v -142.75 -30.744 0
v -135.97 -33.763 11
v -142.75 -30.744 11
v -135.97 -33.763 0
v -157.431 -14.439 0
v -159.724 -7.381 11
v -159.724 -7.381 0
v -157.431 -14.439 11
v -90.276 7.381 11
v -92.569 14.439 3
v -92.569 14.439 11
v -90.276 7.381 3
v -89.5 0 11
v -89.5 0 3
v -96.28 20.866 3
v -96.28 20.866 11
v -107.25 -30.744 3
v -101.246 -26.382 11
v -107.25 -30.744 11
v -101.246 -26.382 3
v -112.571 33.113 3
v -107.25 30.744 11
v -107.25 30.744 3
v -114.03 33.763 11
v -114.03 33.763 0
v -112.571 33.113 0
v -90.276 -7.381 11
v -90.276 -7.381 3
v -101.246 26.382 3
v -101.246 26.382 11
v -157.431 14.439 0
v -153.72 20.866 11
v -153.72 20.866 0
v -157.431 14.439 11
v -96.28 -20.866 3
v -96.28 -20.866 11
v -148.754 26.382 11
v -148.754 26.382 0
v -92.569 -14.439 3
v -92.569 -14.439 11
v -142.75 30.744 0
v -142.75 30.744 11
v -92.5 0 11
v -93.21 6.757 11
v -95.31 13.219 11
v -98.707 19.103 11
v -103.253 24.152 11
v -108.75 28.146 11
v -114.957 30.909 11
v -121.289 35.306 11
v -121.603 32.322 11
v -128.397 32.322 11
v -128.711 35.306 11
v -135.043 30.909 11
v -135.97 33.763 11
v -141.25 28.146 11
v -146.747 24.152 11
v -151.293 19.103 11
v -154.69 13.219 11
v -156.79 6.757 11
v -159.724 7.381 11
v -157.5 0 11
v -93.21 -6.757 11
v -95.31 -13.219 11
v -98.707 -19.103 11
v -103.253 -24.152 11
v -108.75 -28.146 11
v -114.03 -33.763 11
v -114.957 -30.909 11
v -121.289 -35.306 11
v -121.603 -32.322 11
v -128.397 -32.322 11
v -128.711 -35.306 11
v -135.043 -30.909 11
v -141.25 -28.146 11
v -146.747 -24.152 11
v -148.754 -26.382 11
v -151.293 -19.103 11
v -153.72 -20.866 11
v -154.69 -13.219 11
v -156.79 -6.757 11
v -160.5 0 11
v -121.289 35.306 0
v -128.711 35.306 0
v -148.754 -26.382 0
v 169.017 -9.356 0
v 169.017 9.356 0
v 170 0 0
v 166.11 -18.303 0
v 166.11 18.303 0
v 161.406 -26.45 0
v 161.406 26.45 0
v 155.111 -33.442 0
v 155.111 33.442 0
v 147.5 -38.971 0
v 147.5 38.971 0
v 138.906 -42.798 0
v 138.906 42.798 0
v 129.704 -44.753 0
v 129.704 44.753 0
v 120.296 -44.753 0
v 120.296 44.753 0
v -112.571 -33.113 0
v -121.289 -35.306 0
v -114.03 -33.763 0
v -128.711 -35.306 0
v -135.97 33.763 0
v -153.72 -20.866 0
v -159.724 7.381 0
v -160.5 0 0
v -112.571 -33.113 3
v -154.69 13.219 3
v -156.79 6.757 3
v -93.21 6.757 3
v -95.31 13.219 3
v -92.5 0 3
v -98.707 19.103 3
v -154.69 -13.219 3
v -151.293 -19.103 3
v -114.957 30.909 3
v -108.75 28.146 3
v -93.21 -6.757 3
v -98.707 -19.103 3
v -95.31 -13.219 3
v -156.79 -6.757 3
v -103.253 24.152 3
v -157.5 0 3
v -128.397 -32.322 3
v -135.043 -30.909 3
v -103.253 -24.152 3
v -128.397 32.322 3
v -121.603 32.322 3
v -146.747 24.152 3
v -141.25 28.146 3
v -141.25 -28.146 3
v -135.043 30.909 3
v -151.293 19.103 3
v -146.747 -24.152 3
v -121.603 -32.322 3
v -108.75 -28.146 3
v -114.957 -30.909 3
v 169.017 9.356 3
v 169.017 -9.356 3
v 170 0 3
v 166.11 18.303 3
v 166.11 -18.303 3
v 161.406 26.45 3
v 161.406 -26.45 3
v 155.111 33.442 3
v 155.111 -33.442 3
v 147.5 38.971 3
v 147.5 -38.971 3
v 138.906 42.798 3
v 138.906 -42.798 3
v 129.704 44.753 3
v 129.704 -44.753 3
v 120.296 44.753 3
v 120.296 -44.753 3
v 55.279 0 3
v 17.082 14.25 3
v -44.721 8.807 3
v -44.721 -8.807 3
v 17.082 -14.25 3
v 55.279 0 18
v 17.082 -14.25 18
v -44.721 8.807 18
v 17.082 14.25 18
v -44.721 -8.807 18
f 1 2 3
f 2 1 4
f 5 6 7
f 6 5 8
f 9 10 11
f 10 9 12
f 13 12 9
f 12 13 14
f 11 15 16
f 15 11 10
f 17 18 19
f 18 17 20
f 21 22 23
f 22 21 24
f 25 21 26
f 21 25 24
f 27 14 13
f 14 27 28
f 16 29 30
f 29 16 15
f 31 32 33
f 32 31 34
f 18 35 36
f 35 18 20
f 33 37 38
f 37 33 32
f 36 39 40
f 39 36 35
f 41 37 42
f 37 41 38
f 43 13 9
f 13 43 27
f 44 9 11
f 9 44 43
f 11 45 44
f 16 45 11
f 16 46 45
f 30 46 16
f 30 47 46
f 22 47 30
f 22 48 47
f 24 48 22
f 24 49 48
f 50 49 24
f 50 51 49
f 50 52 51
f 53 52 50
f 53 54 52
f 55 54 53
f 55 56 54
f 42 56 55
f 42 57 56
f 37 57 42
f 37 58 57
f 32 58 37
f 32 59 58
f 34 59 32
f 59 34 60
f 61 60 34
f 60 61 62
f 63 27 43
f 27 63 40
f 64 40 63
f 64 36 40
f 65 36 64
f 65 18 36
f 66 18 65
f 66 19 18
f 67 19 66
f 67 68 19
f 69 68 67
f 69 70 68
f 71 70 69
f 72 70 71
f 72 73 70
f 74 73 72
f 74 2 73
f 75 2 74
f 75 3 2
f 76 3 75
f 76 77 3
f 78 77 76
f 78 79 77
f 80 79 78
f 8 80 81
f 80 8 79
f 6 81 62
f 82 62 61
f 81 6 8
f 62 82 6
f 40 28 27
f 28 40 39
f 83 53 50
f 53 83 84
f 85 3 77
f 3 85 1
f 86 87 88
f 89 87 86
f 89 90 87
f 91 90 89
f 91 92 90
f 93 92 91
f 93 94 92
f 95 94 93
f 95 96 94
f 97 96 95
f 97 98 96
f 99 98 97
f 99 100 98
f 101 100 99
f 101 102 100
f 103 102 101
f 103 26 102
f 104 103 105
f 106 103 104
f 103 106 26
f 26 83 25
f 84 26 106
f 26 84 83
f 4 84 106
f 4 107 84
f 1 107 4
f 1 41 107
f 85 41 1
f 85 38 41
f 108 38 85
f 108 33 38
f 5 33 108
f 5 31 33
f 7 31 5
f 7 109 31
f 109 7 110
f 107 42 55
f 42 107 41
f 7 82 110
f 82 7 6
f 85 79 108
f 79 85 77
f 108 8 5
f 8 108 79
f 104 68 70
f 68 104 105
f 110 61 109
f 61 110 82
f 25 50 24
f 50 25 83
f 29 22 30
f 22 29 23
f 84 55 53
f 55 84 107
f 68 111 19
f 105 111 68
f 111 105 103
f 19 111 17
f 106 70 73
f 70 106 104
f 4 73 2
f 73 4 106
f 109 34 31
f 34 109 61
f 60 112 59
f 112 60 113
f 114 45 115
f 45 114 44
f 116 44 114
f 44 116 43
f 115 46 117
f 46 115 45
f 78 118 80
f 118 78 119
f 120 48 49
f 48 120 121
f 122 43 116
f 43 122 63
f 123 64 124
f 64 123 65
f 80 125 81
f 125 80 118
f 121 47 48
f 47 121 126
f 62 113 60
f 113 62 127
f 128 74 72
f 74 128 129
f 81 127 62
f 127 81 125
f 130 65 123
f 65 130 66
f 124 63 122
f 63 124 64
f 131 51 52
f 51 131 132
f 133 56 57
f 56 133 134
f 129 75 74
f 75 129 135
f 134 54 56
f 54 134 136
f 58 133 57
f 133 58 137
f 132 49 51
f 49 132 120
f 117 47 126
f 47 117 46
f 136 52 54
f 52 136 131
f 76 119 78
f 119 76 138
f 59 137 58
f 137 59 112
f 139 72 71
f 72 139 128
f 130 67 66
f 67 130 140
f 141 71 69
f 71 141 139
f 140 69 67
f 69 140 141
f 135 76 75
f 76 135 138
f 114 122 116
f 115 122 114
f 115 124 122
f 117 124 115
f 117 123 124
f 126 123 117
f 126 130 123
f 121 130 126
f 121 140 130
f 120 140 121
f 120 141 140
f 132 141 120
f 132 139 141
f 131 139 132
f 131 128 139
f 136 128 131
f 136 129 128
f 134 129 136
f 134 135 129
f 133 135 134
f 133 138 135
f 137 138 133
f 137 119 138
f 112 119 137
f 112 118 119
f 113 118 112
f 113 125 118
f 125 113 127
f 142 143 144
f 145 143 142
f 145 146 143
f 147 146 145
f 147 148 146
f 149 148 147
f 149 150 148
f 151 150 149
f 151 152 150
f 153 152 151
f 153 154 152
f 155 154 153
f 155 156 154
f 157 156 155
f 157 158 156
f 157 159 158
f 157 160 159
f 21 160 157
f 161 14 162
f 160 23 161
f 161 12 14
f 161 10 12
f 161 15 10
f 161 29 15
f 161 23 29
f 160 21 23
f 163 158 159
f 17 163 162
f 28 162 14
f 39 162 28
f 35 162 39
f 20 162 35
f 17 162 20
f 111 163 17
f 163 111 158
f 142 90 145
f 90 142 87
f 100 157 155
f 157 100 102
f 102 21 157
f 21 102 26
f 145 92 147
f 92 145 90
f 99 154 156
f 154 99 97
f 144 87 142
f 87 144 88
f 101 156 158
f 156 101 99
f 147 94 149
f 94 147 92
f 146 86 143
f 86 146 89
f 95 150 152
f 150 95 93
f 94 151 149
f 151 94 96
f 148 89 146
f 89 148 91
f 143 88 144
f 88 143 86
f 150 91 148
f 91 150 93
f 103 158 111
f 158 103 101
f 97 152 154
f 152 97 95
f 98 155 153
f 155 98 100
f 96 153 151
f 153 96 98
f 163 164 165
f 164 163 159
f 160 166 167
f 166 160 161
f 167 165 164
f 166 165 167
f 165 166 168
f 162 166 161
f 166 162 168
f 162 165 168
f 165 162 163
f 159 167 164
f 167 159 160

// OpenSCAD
/*
 * Standard Parametric Orthosis Template
 *
 * This template generates a standard orthotic insole based on a set of
 * foot measurements and clinical parameters.
 */

// Main module to be called with parameters
module standard_orthosis(
    // Foot Measurements (will come from scan analysis later)
    foot_length = 250,
    foot_width = 95,
    heel_width = 65,
    arch_height = 25,
    forefoot_width = 90,

    // Clinical Parameters (from UI)
    arch_support_height = 15,
    heel_cup_depth = 8,
    material_thickness = 3,

    // Conditional flags
    has_metatarsal_pad = false,
    metatarsal_pad_height = 4
) {
    difference() {
        union() {
            base_orthosis(
                foot_length,
                foot_width,
                heel_width,
                arch_height,
                forefoot_width,
                material_thickness
            );

            arch_support(
                foot_length,
                foot_width,
                arch_height,
                arch_support_height,
                material_thickness
            );

            heel_cup(
                foot_length,
                heel_width,
                heel_cup_depth,
                material_thickness
            );

            if (has_metatarsal_pad) {
                metatarsal_pad(
                    foot_length,
                    forefoot_width,
                    metatarsal_pad_height,
                    material_thickness
                );
            }
        }

        // Negative space of the foot (to be implemented later with mesh subtraction)
        // For now, we just generate the additive parts.
    }
}

// Generates the main body of the orthosis
module base_orthosis(
    length,
    width,
    heel_w,
    arch_h,
    forefoot_w,
    thickness
) {
    linear_extrude(height = thickness) {
        hull() {
            // Heel
            translate([-length / 2, 0, 0])
            circle(d = heel_w);

            // Midfoot
            translate([0, 0, 0])
            circle(d = width * 0.8);

            // Forefoot
            translate([length / 2, 0, 0])
            circle(d = forefoot_w);
        }
    }
}

// Adds medial arch support
module arch_support(length, width, arch_h, support_h, thickness) {
    translate([0, -width/4, thickness]) {
        linear_extrude(height = support_h) {
            translate([0, width/4, 0])
            resize([length * 0.4, width * 0.3, 0])
            circle(d = 1);
        }
    }
}

// Creates a cup around the heel
module heel_cup(length, heel_w, cup_depth, thickness) {
    translate([-length / 2, 0, 0]) {
        difference() {
            cylinder(h = cup_depth + thickness, d = heel_w + thickness * 2);
            translate([0, 0, thickness])
            cylinder(h = cup_depth, d = heel_w);
        }
    }
}

// Adds a metatarsal pad
module metatarsal_pad(length, forefoot_w, pad_h, thickness) {
    translate([length * 0.3, 0, thickness]) {
        linear_extrude(height = pad_h) {
            resize([forefoot_w * 0.5, forefoot_w * 0.4, 0])
            circle(d=1);
        }
    }
}

// Generate the final model
standard_orthosis();
